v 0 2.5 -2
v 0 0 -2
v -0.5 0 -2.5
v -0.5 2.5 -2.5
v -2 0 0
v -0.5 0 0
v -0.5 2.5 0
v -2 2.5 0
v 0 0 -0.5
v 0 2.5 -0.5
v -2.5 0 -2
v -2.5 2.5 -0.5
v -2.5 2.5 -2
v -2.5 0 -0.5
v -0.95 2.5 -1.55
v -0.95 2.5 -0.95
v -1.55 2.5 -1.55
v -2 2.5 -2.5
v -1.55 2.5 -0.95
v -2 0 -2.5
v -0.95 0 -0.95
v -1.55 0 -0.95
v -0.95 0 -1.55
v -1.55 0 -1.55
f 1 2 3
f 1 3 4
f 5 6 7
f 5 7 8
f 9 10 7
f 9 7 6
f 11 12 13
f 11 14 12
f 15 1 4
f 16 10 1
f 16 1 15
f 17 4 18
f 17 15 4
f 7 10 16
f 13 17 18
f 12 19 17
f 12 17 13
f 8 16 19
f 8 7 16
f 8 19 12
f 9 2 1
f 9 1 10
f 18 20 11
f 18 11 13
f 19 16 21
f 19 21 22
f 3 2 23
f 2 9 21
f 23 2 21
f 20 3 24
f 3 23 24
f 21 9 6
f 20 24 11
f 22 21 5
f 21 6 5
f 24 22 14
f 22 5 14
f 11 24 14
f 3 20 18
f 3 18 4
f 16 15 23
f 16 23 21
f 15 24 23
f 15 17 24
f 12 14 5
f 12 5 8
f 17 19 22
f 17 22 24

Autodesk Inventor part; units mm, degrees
ref_plane "YZ Plane" through (0, 0, 0) normal (1, 0, 0) x (0, 1, 0)
ref_plane "XZ Plane" through (0, 0, 0) normal (0, 1, 0) x (-1, 0, 0)
ref_plane "XY Plane" through (0, 0, 0) normal (0, 0, 1) x (1, 0, 0)
sketch "Sketch1" plane through (0, 0, 0) normal (0, 1, 0) x (-1, 0, 0)
  line L0 (0, 0) -> (2.5, 0)
  line L1 (2.5, 0) -> (2.5, -2.5)
  line L2 (2.5, -2.5) -> (0, -2.5)
  line L3 (0, -2.5) -> (0, 0)
  dimension "d0" = 2.5
extrude "Extrusion1" add sketch "Sketch1" along normal blind 2.5
chamfer "Chamfer1" distance 0.5 angle 45 4 edges at (0, 1.25, 0) (-2.5, 1.25, 0) (0, 1.25, -2.5) (-2.5, 1.25, -2.5)
sketch "Sketch2" plane through (0, 2.5, 0) normal (0, 1, 0) x (1, 0, 0)
  line L0 (-0.5, 0) -> (-2, 0) projected
  line L1 (-1.25, 0) -> (-1.25, 2.5) construction
  line L2 (-2, 2.5) -> (-0.5, 2.5) projected
  line L3 (-2.5, 0.5) -> (-2.5, 2) projected
  line L4 (-2.5, 1.25) -> (0, 1.25) construction
  line L5 (0, 0.5) -> (0, 2) projected
  line L6 (-0.95, 0.95) -> (-1.55, 0.95)
  line L7 (-1.55, 0.95) -> (-1.55, 1.55)
  line L8 (-1.55, 1.55) -> (-0.95, 1.55)
  line L9 (-0.95, 1.55) -> (-0.95, 0.95)
  line L10 (-0.95, 0.95) -> (-1.55, 1.55) construction
  line L11 (-1.55, 0.95) -> (-0.95, 1.55) construction
  point P0 (0, 0)
  point P1 (-1.25, 1.25)
  dimension "d6" = 0.6
extrude "Extrusion2" cut sketch "Sketch2" against normal up to next
properties part number "Pin Shroud"
